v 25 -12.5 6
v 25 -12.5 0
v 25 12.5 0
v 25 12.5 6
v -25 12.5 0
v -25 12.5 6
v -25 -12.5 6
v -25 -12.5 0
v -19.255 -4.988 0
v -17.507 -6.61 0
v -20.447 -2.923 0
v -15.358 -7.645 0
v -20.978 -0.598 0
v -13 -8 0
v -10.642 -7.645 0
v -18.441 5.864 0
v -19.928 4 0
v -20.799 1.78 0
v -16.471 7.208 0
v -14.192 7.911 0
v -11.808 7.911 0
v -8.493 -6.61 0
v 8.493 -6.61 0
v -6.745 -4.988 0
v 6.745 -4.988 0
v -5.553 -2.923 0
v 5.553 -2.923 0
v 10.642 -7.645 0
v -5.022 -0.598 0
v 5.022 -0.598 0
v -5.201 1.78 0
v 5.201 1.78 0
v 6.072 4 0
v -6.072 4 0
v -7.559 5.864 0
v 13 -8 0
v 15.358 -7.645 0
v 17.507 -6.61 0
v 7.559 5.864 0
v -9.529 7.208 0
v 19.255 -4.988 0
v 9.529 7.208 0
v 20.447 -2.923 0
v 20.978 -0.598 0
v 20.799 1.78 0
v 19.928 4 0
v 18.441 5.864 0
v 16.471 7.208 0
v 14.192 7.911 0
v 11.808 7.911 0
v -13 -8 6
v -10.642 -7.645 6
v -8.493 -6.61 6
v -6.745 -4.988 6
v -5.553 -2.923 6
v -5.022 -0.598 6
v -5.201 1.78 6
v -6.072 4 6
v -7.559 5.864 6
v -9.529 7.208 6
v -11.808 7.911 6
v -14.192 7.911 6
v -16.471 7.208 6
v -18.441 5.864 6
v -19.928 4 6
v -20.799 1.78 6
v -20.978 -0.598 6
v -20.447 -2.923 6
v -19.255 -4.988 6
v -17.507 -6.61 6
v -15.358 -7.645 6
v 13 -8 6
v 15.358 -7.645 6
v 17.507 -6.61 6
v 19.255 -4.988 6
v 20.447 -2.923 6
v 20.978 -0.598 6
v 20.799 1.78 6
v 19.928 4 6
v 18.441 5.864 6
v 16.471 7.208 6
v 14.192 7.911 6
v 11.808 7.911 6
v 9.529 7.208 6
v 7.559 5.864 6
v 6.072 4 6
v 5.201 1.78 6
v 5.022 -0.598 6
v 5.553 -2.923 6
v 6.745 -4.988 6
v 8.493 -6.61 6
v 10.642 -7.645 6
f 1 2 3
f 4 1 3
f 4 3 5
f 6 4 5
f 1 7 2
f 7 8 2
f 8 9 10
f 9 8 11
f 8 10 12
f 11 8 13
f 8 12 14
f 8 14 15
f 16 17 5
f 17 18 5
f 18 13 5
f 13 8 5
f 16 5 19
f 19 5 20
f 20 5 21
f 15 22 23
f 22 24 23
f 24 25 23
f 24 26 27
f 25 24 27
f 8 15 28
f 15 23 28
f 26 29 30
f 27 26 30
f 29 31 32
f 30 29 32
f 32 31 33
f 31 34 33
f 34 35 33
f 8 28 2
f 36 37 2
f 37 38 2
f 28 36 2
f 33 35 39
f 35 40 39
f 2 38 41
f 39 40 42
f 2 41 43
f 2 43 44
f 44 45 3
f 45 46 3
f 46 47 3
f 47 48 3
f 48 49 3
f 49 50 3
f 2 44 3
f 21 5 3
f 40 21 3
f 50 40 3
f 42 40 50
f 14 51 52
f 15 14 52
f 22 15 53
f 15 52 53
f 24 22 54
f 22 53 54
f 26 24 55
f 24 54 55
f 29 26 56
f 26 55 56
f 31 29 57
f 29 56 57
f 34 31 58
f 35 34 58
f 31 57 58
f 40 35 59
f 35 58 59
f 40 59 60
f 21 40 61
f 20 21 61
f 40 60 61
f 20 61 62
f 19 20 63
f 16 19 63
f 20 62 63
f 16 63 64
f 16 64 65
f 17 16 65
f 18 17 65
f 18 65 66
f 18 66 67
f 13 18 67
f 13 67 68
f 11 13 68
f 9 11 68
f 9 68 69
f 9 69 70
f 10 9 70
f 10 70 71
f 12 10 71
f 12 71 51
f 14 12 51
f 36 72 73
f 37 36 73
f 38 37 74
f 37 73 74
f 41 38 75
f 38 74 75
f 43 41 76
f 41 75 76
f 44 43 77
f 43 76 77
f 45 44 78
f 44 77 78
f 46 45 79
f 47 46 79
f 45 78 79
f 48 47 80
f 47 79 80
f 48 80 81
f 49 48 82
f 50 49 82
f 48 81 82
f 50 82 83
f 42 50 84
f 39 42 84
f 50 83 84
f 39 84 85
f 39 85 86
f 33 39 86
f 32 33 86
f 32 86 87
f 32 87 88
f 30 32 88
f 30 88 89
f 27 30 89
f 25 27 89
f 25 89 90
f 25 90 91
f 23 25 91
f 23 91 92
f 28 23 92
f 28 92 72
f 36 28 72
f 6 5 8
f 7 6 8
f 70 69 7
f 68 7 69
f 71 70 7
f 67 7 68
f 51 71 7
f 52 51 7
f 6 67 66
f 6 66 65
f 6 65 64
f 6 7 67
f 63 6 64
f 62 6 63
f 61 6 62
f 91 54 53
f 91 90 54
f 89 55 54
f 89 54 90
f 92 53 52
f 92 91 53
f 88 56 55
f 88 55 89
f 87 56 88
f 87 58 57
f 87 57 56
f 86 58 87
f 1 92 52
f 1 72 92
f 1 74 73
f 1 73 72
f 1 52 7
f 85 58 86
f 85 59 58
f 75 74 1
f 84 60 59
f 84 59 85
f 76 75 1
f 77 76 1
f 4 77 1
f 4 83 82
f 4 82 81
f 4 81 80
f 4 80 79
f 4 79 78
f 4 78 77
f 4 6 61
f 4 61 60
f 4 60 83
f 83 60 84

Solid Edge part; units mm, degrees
sketch "Sketch1" plane through (0, 0, 0) normal (0, 0, 1) x (1, 0, 0)
  line L0 (-25, -12.5) -> (25, -12.5)
  line L1 (25, -12.5) -> (25, 12.5)
  line L2 (25, 12.5) -> (-25, 12.5)
  line L3 (-25, 12.5) -> (-25, -12.5)
  dimension "D1" = 25
extrude "Protrusion1" add sketch "Sketch1" along normal blind 6
hole "Hole_1" at (-13, 0, 6) direction (0, 0, -1) diameter 16 end up to next
hole "Hole1" at (13, 0, 6) direction (0, 0, -1) diameter 16 end up to next
